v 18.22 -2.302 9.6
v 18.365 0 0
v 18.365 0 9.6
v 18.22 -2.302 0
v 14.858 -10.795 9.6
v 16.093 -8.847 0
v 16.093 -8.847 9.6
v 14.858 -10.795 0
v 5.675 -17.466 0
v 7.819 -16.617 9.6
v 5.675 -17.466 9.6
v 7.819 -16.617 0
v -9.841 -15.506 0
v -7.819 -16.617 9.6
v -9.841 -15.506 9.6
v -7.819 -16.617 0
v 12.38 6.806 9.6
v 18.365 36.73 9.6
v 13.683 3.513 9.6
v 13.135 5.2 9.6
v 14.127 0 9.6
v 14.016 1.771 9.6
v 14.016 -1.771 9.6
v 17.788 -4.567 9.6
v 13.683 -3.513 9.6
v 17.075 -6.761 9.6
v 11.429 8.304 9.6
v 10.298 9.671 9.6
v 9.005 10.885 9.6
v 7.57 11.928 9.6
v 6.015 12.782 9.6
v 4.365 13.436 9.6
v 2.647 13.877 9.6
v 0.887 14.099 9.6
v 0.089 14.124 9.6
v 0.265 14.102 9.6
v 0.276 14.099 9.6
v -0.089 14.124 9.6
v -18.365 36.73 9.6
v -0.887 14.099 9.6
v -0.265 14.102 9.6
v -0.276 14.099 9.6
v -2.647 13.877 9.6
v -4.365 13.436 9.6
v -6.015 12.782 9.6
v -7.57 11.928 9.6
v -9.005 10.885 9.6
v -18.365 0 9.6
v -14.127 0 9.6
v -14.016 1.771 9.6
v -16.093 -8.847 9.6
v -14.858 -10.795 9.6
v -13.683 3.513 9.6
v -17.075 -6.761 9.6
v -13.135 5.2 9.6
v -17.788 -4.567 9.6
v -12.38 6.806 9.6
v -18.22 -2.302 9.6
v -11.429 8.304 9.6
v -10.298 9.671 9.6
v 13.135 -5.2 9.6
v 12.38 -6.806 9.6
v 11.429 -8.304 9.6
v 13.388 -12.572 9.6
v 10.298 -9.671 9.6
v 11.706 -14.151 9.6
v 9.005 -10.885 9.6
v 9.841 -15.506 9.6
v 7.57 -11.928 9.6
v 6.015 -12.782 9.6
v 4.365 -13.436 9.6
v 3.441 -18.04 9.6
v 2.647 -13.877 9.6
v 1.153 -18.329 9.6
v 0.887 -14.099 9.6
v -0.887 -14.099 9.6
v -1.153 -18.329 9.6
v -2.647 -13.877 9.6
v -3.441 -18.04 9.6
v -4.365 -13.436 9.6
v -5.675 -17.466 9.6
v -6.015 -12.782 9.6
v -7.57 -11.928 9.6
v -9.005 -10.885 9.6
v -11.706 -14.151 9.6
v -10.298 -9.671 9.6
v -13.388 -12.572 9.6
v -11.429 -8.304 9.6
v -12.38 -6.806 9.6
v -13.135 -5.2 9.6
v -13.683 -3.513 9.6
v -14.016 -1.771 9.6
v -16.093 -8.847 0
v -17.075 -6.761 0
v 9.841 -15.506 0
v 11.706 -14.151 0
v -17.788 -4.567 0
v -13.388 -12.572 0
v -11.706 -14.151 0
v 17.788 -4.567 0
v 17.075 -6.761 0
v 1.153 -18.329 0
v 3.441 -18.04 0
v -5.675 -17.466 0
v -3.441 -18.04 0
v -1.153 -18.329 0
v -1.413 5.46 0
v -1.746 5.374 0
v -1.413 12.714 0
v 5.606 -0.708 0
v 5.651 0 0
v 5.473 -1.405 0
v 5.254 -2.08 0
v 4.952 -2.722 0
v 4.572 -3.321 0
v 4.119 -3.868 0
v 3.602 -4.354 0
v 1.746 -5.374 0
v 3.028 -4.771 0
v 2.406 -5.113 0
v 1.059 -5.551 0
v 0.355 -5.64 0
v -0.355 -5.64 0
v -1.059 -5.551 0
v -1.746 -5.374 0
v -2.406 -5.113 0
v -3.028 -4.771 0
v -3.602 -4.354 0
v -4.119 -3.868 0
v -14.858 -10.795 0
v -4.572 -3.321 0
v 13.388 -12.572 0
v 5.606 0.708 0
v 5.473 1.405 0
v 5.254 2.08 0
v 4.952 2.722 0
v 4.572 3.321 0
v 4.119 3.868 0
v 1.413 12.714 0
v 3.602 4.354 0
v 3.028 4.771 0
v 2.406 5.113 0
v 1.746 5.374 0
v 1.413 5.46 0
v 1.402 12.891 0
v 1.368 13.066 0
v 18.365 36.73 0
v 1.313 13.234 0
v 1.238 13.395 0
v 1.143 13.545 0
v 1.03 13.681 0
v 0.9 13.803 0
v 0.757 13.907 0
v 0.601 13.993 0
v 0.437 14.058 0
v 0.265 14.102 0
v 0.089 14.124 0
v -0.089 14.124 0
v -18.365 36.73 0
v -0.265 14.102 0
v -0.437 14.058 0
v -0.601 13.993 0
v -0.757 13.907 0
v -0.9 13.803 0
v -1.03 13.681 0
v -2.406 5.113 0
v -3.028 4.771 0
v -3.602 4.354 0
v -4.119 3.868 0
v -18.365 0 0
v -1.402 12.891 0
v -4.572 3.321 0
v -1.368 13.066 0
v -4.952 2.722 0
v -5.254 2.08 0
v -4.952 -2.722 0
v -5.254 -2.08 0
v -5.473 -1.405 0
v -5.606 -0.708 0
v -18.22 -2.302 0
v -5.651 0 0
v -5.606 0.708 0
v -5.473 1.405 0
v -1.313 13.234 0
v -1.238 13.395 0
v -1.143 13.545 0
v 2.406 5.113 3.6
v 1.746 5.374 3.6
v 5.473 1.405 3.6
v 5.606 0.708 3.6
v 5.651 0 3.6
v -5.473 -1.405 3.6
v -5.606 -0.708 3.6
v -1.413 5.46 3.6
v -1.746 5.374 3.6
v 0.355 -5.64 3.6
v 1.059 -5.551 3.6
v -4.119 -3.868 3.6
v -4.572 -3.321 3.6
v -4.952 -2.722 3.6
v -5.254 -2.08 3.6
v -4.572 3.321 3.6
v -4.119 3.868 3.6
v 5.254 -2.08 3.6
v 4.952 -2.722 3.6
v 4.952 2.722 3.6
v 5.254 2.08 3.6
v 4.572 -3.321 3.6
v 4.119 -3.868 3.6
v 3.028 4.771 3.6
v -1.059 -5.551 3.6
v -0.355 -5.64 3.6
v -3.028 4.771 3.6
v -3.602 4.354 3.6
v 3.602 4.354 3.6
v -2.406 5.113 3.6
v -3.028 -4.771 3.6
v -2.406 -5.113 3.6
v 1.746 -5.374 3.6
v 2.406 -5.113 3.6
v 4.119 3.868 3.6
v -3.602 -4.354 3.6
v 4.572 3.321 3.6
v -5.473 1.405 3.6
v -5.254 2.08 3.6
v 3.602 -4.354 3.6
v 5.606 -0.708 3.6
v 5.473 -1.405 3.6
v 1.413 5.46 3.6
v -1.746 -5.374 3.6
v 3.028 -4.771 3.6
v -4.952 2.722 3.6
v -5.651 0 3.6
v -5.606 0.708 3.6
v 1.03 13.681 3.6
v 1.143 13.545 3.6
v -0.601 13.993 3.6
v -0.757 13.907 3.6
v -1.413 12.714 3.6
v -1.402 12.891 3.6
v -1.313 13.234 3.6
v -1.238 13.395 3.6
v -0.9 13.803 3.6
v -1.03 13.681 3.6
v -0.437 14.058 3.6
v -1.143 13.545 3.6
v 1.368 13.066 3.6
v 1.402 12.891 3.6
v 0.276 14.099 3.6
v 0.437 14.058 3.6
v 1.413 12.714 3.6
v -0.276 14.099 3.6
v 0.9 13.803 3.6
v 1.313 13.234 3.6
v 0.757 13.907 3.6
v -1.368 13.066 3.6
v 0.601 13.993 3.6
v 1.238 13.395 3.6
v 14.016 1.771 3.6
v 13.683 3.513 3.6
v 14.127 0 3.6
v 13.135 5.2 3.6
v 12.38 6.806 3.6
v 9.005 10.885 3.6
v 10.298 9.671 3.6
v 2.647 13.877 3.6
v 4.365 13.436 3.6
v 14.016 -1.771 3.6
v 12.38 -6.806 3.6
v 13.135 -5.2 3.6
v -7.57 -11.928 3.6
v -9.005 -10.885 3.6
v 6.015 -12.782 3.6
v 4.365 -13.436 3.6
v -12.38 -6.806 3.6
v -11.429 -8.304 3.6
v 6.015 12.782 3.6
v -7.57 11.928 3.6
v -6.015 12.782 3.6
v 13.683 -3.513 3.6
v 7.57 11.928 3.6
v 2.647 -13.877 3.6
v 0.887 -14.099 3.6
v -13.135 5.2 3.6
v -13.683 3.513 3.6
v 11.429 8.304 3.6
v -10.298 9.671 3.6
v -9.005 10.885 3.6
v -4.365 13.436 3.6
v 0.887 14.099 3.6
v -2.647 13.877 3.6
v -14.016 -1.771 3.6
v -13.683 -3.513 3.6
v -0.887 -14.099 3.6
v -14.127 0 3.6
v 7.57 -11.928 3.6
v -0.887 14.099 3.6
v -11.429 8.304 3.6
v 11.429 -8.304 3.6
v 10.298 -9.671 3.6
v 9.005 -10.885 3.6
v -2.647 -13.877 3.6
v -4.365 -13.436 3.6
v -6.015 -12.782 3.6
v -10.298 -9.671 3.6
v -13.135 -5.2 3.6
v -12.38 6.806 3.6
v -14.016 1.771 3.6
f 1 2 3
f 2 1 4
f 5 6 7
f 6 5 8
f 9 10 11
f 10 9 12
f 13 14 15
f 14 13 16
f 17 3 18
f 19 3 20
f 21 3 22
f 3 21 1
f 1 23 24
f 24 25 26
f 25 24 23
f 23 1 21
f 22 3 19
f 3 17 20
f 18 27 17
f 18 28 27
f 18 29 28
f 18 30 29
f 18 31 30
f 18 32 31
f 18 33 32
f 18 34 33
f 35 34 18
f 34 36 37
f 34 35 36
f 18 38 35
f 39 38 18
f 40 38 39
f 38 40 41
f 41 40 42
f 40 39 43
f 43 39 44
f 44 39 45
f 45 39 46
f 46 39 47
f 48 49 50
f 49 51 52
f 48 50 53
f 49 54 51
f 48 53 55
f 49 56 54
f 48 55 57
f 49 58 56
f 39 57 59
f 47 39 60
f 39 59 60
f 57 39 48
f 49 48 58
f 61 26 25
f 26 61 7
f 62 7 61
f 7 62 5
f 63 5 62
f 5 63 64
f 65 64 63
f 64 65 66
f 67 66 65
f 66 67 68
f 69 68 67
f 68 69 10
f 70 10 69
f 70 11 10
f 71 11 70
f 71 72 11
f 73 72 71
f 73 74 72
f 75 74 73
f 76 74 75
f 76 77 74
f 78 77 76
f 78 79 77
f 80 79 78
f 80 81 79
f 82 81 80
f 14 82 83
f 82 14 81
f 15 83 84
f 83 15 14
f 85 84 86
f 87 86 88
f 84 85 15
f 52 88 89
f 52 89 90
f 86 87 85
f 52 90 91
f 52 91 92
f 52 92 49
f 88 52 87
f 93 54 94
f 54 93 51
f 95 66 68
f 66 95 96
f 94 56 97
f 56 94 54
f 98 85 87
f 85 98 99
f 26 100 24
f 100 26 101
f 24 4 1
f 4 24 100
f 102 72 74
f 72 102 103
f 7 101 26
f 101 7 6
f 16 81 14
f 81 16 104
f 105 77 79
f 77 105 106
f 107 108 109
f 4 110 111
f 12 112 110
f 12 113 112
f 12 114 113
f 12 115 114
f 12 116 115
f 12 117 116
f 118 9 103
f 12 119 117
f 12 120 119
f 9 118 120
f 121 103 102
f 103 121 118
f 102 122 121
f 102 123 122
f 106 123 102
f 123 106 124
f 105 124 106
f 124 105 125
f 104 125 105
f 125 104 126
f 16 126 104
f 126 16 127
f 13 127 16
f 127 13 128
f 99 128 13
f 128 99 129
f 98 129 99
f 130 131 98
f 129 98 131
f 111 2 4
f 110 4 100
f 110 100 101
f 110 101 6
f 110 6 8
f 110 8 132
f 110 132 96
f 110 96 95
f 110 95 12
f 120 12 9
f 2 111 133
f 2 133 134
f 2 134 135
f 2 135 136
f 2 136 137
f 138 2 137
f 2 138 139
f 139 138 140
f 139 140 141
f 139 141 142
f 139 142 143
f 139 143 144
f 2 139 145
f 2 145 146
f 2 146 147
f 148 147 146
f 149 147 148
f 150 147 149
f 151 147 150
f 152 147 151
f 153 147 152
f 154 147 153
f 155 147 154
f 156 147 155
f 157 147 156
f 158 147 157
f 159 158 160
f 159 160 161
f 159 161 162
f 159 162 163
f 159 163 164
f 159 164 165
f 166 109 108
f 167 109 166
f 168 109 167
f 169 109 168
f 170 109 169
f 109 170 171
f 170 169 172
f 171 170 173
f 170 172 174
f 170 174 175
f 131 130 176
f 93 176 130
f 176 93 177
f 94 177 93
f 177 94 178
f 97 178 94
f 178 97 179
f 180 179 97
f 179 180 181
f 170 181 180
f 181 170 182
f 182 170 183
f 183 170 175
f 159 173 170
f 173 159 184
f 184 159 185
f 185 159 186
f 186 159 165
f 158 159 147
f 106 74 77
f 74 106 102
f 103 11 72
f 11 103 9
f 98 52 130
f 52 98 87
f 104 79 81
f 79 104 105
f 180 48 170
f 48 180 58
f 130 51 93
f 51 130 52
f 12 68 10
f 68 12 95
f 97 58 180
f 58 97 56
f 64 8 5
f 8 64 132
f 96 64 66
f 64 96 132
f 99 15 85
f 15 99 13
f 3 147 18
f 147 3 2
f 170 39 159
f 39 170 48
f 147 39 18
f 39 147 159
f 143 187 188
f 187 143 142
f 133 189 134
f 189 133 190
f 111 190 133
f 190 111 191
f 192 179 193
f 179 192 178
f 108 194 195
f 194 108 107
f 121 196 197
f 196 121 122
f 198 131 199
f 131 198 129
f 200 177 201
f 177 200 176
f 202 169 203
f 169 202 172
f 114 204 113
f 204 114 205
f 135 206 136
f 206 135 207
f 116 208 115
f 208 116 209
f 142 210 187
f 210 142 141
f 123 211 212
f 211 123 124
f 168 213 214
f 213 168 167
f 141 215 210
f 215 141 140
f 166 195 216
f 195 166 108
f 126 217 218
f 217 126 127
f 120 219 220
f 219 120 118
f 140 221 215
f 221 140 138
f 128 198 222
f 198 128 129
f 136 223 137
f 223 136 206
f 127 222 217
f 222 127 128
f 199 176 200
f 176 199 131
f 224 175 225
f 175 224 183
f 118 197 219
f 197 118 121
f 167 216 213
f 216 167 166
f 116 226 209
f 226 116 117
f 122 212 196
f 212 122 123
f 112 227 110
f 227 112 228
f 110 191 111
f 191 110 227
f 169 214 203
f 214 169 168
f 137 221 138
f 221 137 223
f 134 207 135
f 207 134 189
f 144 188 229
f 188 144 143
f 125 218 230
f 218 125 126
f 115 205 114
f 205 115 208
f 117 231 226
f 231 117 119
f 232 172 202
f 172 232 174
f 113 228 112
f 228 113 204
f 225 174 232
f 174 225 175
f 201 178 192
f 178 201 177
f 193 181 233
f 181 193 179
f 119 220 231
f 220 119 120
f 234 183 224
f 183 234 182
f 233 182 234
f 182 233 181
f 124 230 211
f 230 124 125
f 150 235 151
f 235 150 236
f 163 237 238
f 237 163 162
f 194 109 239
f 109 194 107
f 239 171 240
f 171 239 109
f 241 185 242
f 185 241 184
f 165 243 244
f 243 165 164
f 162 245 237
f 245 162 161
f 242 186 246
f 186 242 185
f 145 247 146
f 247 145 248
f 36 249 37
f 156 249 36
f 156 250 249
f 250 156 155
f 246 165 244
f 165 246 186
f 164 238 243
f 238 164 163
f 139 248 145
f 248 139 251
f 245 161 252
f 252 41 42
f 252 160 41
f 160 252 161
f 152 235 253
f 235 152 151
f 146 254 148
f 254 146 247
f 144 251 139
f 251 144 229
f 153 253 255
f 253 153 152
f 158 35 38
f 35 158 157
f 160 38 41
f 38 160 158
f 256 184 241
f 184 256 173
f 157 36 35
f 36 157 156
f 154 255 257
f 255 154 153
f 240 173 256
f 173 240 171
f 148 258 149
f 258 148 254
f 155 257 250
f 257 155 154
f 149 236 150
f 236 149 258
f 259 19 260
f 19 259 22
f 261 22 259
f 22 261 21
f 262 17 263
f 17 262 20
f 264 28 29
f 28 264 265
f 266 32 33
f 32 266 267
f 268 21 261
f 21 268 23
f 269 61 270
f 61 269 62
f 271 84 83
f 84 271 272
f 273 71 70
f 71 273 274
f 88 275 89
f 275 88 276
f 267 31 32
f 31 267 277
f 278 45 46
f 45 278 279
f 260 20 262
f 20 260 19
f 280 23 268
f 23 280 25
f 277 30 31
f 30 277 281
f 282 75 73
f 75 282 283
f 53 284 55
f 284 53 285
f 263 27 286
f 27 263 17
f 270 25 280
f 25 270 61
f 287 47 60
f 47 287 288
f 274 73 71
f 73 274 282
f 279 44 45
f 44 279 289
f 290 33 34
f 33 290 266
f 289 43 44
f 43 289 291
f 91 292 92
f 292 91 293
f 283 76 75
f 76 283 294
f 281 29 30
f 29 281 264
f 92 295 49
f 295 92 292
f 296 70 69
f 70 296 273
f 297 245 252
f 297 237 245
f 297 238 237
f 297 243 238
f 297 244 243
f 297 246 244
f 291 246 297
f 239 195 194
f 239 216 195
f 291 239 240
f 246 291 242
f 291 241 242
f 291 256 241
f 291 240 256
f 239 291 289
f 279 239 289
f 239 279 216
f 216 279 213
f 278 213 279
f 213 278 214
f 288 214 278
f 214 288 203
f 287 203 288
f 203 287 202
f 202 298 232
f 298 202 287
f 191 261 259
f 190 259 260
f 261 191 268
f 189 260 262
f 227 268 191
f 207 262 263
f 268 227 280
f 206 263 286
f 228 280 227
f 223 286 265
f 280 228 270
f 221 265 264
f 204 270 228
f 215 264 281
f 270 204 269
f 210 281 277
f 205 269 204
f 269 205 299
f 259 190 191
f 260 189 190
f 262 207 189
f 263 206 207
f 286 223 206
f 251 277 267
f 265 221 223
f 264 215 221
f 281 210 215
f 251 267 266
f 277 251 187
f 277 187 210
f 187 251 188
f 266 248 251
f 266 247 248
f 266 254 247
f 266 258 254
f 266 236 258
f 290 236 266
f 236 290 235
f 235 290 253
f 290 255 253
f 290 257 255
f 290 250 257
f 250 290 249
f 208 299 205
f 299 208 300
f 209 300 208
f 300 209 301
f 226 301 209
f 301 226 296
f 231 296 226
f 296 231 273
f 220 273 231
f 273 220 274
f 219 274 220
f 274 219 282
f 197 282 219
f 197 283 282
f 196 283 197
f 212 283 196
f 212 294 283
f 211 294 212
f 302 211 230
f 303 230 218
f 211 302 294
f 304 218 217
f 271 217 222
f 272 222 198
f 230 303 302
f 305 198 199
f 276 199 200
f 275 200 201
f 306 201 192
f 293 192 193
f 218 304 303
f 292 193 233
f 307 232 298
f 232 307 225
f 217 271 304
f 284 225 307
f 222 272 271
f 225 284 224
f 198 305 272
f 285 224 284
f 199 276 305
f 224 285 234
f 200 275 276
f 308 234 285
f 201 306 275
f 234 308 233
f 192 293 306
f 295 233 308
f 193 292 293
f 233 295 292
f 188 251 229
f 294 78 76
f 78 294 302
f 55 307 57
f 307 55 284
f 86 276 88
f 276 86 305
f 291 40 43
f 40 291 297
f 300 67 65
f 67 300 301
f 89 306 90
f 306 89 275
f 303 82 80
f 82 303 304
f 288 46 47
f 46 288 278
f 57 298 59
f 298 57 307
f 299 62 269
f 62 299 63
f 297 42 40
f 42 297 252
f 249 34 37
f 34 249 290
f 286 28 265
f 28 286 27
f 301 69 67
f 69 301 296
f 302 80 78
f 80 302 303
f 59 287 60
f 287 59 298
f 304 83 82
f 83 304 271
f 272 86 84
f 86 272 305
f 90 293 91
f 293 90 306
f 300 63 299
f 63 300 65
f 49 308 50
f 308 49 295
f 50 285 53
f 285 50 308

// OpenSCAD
$fn=50;

actual_core_dia = 27.7;
core_dia = actual_core_dia * 1.02;
core_thickness = 6;

core_ext_dia = core_dia * 1.3;
body_thickness = core_thickness * 1.6;

module power_cutout() {
    slot_dia = core_dia * 0.1;
    cylinder(body_thickness, d = core_dia * 0.4);
    hull() {
        cylinder(body_thickness, d = slot_dia);
        translate([0, core_dia * 0.5 - slot_dia/2, 0]) cylinder(body_thickness, d = slot_dia);
    }
}

module gravestone() {
    cylinder(body_thickness, d = core_ext_dia);
    translate([-core_ext_dia/2, 0, 0]) cube([core_ext_dia, core_ext_dia, body_thickness]);
}

module body() {
    difference() {
        gravestone();
        translate([0, 0, body_thickness - core_thickness]) cylinder(core_thickness, d = core_dia);
        power_cutout();
    }
}

body();
